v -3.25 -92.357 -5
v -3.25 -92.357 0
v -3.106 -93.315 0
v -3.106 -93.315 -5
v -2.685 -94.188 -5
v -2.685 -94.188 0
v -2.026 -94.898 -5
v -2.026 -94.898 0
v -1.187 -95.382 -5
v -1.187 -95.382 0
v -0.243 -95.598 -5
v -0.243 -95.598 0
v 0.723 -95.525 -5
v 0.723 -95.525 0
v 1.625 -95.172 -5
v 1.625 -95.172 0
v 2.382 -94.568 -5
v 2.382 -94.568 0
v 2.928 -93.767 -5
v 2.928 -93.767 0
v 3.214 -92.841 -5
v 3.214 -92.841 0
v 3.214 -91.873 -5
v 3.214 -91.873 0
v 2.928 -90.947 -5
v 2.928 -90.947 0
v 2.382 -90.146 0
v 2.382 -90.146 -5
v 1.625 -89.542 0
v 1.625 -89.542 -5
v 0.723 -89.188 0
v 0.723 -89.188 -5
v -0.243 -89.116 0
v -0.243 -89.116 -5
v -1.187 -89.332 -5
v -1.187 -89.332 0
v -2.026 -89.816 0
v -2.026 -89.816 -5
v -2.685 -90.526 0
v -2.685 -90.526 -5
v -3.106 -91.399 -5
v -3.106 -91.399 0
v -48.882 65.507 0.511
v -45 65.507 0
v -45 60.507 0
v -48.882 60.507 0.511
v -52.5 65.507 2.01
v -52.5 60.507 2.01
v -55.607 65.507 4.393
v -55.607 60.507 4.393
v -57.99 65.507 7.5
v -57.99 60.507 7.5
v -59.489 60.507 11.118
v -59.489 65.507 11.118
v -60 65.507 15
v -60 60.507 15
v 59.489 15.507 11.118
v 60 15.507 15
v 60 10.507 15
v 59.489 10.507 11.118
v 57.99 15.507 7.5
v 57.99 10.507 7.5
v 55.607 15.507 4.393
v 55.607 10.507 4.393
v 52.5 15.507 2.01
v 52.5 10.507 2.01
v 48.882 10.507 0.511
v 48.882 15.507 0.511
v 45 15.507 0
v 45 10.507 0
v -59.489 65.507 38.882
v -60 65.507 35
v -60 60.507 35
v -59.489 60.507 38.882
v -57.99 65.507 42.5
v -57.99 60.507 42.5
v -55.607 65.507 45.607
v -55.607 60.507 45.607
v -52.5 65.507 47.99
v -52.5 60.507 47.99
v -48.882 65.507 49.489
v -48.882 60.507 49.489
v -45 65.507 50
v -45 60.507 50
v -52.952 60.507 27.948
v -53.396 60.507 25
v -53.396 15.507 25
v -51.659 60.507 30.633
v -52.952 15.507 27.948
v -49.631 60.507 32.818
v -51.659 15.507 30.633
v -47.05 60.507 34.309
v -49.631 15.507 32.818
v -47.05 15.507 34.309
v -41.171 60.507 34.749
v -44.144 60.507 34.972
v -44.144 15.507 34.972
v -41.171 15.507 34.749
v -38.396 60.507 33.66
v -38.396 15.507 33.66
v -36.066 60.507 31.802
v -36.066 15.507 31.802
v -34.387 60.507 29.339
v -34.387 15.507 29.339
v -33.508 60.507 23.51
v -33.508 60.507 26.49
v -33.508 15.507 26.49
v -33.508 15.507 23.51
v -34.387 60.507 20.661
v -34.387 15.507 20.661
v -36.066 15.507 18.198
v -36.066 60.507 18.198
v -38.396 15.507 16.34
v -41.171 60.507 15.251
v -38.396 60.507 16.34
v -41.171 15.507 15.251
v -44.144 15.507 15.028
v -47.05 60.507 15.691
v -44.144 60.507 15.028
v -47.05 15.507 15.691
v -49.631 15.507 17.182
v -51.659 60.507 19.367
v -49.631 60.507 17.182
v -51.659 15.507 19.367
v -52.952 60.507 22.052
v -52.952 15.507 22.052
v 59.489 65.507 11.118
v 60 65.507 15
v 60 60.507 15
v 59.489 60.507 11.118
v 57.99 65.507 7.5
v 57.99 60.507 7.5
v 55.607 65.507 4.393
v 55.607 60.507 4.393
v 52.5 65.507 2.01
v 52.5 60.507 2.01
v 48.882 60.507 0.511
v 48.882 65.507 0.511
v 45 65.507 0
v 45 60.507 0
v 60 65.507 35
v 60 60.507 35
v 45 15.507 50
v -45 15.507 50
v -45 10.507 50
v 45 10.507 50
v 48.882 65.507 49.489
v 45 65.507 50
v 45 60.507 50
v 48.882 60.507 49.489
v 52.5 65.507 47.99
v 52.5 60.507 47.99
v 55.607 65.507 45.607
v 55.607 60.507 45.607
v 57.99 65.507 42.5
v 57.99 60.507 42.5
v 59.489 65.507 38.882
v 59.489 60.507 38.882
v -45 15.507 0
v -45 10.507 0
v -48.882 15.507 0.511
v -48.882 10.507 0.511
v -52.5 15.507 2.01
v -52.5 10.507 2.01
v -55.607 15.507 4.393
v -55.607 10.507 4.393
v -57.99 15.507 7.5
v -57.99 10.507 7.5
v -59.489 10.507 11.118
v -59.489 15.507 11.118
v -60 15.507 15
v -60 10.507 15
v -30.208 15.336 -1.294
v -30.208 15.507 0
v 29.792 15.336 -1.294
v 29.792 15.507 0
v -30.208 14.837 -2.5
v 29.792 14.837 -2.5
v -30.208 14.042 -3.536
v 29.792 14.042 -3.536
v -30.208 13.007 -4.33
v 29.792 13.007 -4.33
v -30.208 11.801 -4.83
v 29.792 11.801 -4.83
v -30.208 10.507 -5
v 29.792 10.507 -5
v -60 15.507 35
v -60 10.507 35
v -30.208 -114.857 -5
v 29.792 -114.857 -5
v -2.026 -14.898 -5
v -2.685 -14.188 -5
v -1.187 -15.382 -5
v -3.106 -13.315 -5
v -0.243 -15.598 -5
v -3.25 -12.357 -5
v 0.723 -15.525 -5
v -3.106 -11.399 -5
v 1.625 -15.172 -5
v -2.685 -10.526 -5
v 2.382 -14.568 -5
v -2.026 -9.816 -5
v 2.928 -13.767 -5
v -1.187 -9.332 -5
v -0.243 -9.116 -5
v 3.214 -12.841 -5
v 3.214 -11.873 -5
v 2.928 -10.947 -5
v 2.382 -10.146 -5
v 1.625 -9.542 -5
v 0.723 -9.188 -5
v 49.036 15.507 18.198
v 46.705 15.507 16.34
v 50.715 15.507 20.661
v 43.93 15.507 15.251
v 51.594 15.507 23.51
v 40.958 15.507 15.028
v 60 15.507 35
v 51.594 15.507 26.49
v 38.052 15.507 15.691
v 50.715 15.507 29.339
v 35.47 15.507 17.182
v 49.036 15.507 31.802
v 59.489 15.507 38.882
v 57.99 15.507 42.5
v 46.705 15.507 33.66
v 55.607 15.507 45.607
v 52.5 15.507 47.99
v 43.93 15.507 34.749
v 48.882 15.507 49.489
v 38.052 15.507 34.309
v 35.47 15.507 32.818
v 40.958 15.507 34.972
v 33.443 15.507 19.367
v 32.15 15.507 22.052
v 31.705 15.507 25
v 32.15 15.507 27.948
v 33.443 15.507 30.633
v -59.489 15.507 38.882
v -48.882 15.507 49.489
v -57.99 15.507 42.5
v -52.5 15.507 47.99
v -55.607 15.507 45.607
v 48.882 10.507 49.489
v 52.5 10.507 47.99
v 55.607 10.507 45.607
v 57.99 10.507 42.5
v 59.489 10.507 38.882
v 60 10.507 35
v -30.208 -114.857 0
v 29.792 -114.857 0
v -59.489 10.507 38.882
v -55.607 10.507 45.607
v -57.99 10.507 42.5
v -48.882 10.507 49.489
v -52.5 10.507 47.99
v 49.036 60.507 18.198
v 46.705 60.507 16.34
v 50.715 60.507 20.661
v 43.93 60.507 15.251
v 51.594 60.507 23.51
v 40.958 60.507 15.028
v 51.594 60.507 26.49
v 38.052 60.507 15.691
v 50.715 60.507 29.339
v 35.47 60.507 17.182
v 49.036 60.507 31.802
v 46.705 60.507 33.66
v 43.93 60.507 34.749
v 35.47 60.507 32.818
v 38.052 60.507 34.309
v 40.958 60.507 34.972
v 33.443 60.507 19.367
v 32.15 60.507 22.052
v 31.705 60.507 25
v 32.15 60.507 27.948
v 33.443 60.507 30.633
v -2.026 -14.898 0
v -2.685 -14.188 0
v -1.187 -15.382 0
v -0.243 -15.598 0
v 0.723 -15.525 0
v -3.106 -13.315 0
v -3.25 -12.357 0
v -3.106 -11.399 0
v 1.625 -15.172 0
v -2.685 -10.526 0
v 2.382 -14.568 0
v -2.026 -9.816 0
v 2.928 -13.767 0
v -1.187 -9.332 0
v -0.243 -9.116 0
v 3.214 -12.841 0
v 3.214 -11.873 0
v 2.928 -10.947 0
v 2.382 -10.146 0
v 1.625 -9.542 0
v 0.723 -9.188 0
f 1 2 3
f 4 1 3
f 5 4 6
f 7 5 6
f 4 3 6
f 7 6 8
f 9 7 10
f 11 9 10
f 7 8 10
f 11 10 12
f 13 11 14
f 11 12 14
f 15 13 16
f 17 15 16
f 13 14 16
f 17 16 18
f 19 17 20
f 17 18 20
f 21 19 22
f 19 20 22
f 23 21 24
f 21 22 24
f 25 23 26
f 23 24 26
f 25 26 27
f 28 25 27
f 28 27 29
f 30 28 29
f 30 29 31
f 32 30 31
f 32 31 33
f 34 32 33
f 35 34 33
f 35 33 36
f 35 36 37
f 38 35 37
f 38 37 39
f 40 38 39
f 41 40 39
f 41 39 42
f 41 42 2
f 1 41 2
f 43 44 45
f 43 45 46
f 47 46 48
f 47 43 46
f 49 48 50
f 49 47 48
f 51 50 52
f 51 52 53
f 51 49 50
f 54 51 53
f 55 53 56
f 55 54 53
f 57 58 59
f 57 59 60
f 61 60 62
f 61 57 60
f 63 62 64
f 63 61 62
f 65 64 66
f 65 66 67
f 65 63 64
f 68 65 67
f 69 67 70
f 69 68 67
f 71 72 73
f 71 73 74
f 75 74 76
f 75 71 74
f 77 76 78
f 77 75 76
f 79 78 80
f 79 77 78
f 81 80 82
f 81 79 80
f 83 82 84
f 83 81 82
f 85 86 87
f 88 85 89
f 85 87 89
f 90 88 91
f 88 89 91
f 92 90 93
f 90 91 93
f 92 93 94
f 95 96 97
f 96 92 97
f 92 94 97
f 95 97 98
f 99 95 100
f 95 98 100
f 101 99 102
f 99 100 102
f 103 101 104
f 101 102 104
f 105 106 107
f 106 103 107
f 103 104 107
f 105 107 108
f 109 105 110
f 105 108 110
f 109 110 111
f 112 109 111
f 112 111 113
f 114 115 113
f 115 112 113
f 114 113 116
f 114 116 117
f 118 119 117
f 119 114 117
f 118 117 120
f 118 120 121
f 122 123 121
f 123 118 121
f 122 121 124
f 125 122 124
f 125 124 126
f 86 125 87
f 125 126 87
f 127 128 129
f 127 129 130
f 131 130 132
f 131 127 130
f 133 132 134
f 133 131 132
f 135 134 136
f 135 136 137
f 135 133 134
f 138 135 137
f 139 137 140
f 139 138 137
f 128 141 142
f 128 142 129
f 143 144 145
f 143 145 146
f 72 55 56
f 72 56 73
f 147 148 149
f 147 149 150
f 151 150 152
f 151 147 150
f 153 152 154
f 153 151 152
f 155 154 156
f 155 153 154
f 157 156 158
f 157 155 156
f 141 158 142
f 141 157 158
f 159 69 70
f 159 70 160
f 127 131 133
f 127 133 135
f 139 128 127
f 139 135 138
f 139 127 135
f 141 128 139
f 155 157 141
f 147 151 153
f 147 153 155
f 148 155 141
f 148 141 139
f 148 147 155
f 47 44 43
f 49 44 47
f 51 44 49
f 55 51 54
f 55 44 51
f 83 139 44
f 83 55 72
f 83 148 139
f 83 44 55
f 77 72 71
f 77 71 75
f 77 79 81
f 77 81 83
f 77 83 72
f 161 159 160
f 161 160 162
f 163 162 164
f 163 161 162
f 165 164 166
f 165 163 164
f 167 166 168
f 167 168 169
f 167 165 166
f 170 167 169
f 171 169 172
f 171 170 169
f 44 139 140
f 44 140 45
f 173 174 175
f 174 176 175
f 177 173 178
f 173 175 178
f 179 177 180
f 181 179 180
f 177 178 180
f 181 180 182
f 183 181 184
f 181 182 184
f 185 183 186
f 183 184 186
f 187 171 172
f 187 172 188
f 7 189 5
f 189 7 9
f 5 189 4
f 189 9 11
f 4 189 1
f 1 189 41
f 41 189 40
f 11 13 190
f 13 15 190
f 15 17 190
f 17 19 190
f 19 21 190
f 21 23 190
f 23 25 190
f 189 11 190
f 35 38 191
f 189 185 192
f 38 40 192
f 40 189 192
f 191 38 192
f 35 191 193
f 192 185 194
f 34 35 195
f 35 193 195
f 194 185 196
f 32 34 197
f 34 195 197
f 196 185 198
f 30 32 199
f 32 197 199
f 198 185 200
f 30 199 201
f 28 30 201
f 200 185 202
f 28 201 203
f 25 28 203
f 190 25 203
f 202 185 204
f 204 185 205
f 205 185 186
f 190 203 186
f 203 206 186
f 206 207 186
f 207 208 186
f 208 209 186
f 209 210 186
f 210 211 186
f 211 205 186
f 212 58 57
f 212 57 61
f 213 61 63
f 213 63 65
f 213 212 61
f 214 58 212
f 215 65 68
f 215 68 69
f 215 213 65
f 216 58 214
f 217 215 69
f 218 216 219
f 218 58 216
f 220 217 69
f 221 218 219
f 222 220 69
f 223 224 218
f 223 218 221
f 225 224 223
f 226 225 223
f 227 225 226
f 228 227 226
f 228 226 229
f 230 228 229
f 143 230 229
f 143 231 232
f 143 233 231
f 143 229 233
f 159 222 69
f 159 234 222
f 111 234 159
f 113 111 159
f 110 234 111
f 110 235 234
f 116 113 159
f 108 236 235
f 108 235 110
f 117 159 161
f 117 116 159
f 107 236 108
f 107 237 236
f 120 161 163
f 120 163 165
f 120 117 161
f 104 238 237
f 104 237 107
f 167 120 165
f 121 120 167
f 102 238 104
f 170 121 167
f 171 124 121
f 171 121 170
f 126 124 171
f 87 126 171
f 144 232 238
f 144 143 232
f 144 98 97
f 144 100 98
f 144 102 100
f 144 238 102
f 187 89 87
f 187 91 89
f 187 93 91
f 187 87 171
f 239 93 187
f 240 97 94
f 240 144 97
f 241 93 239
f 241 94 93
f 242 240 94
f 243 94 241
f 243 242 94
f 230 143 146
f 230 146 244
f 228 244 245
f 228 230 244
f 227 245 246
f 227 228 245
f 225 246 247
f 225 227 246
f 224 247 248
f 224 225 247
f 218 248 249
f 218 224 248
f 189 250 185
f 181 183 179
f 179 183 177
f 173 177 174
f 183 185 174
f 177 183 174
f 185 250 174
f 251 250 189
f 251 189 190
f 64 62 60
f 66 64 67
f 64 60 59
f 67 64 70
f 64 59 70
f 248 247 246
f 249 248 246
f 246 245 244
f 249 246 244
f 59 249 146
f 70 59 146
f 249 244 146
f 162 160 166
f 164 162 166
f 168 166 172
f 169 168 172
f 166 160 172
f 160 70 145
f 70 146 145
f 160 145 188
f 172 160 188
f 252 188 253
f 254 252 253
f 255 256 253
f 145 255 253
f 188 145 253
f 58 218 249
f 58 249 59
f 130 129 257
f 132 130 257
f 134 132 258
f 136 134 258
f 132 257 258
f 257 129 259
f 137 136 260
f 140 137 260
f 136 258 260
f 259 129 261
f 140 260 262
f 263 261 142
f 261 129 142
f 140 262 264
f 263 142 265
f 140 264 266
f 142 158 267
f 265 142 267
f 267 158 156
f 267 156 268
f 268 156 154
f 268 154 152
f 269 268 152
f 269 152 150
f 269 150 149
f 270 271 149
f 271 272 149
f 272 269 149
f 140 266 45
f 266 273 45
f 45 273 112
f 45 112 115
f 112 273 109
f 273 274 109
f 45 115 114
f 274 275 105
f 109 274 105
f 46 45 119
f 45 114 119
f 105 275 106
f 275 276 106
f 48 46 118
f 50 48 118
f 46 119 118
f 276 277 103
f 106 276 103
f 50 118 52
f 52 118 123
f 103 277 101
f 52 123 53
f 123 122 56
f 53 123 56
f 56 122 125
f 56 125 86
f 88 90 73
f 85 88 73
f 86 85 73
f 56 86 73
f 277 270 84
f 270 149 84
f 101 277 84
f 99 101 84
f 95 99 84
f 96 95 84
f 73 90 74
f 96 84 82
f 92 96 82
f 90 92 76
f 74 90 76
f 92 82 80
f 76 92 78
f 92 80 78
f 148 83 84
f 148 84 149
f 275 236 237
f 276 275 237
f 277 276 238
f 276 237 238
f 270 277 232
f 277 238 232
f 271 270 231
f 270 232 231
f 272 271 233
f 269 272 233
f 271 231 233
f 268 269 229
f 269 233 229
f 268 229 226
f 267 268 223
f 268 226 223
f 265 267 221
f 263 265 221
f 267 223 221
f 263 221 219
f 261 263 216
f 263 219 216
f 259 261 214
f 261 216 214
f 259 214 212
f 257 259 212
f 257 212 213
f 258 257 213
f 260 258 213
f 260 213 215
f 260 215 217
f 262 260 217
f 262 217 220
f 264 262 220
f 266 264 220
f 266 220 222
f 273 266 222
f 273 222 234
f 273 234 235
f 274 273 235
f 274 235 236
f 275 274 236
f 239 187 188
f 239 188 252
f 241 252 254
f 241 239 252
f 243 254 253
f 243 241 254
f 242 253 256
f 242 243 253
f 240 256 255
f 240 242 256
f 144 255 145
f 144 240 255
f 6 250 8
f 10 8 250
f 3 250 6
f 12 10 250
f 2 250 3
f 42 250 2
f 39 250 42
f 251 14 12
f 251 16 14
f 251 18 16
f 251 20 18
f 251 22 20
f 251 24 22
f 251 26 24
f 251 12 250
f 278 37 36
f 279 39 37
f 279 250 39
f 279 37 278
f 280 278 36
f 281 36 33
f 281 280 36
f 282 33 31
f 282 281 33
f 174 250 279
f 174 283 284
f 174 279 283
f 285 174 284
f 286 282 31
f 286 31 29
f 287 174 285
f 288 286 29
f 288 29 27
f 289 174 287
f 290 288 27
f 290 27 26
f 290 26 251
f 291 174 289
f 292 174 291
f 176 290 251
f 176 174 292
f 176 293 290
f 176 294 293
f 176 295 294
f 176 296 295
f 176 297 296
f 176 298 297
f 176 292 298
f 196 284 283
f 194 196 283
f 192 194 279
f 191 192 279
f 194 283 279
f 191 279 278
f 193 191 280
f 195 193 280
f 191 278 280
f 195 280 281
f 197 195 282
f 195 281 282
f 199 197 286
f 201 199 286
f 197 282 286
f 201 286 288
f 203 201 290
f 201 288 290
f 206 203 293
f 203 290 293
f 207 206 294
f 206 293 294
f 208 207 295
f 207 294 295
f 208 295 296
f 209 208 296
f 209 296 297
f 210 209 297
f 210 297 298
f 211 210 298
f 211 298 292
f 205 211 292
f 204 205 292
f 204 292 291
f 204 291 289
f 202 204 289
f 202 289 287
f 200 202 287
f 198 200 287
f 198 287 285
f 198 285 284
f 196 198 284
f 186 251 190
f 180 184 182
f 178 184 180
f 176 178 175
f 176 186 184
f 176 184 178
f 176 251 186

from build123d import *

# Parameters (mm, degrees)
F0_W     = 60
F0_H     = 130.3636354738
F1_DEPTH = 5
F3_DEPTH = 5
F4_R     = 10
F5_DEPTH = 50
F6_R     = 10
F7_DEPTH = 5
F9_D     = 6.5
F9_DEPTH = 6
F9_TIP   = 1.9527970118
F10_R    = 4.99999


# Not quite as in the source:
# - a fillet or chamfer is up to 0.001 mm smaller than in the source, because OpenCascade refuses the exact size


with BuildPart() as f1:
    # F0 (on Top) → F1 (new body)
    with BuildSketch(Plane.XY):
        with Locations((-0.2075759694, -49.6751572937)):
            Rectangle(F0_W, F0_H)
    extrude(amount=-F1_DEPTH)

    # F9
    with Locations(Plane(origin=(0, 0, -5), x_dir=(1, 0, 0), z_dir=(0, 0, -1))):
        with Locations((0, 12.3569750306), (0, 92.3569750306)):
            Hole(F9_D / 2, depth=F9_DEPTH)
            with Locations((0, 0, -(F9_DEPTH + F9_TIP / 2))):  # 118° drill point
                Cone(0, F9_D / 2, F9_TIP, mode=Mode.SUBTRACT)

    # F10 (radius 5 in the source; OpenCascade refuses exactly that, so slightly less here)
    f10_edges = [f1.edges().sort_by_distance(p)[0] for p in [
        (-0.207576, 15.50666, -5),
    ]]
    fillet(f10_edges, radius=F10_R)


with BuildPart() as f3:
    # F2 (on face) → F3 (new body)
    with BuildSketch(Plane(origin=(0, 15.5066604432, 0), x_dir=(-1, 0, 0), z_dir=(0, 1, 0))):
        with BuildLine():
            ThreePointArc((-60, 15), (-55.6066017178, 4.3933982822), (-45, 0))
            Line((-45, 0), (-29.7924240306, 0))
            Line((-29.7924240306, 0), (30.2075759694, 0))
            Line((30.2075759694, 0), (45, 0))
            ThreePointArc((45, 0), (55.6066017178, 4.3933982822), (60, 15))
            Line((60, 15), (60, 35))
            ThreePointArc((60, 35), (55.6066017178, 45.6066017178), (45, 50))
            Line((45, 50), (-45, 50))
            ThreePointArc((-45, 50), (-55.6066017178, 45.6066017178), (-60, 35))
            Line((-60, 35), (-60, 15))
        make_face()
    extrude(amount=-F3_DEPTH)

    # F4 (on face) → F5 (join)
    with BuildSketch(Plane(origin=(0, 15.5066604432, 0), x_dir=(-1, 0, 0), z_dir=(0, 1, 0))):
        with Locations((-41.705287993, 25)):
            Circle(F4_R)
        with Locations((43.3963425457, 25)):
            Circle(F4_R)
    extrude(amount=F5_DEPTH)

    # F6 (on face) → F7 (join)
    with BuildSketch(Plane(origin=(0, 65.5066604432, 0), x_dir=(-1, 0, 0), z_dir=(0, 1, 0))):
        with BuildLine():
            Line((-45, 0), (45, 0))
            ThreePointArc((45, 0), (55.6066017178, 4.3933982822), (60, 15))
            Line((60, 15), (60, 35))
            ThreePointArc((60, 35), (55.6066017178, 45.6066017178), (45, 50))
            Line((45, 50), (-45, 50))
            ThreePointArc((-45, 50), (-55.6066017178, 45.6066017178), (-60, 35))
            Line((-60, 35), (-60, 15))
            ThreePointArc((-60, 15), (-55.6066017178, 4.3933982822), (-45, 0))
        make_face()
        with Locations((-41.705287993, 25)):
            Circle(F6_R, mode=Mode.SUBTRACT)
    extrude(amount=-F7_DEPTH)


solid = Compound([f1.part, f3.part])
